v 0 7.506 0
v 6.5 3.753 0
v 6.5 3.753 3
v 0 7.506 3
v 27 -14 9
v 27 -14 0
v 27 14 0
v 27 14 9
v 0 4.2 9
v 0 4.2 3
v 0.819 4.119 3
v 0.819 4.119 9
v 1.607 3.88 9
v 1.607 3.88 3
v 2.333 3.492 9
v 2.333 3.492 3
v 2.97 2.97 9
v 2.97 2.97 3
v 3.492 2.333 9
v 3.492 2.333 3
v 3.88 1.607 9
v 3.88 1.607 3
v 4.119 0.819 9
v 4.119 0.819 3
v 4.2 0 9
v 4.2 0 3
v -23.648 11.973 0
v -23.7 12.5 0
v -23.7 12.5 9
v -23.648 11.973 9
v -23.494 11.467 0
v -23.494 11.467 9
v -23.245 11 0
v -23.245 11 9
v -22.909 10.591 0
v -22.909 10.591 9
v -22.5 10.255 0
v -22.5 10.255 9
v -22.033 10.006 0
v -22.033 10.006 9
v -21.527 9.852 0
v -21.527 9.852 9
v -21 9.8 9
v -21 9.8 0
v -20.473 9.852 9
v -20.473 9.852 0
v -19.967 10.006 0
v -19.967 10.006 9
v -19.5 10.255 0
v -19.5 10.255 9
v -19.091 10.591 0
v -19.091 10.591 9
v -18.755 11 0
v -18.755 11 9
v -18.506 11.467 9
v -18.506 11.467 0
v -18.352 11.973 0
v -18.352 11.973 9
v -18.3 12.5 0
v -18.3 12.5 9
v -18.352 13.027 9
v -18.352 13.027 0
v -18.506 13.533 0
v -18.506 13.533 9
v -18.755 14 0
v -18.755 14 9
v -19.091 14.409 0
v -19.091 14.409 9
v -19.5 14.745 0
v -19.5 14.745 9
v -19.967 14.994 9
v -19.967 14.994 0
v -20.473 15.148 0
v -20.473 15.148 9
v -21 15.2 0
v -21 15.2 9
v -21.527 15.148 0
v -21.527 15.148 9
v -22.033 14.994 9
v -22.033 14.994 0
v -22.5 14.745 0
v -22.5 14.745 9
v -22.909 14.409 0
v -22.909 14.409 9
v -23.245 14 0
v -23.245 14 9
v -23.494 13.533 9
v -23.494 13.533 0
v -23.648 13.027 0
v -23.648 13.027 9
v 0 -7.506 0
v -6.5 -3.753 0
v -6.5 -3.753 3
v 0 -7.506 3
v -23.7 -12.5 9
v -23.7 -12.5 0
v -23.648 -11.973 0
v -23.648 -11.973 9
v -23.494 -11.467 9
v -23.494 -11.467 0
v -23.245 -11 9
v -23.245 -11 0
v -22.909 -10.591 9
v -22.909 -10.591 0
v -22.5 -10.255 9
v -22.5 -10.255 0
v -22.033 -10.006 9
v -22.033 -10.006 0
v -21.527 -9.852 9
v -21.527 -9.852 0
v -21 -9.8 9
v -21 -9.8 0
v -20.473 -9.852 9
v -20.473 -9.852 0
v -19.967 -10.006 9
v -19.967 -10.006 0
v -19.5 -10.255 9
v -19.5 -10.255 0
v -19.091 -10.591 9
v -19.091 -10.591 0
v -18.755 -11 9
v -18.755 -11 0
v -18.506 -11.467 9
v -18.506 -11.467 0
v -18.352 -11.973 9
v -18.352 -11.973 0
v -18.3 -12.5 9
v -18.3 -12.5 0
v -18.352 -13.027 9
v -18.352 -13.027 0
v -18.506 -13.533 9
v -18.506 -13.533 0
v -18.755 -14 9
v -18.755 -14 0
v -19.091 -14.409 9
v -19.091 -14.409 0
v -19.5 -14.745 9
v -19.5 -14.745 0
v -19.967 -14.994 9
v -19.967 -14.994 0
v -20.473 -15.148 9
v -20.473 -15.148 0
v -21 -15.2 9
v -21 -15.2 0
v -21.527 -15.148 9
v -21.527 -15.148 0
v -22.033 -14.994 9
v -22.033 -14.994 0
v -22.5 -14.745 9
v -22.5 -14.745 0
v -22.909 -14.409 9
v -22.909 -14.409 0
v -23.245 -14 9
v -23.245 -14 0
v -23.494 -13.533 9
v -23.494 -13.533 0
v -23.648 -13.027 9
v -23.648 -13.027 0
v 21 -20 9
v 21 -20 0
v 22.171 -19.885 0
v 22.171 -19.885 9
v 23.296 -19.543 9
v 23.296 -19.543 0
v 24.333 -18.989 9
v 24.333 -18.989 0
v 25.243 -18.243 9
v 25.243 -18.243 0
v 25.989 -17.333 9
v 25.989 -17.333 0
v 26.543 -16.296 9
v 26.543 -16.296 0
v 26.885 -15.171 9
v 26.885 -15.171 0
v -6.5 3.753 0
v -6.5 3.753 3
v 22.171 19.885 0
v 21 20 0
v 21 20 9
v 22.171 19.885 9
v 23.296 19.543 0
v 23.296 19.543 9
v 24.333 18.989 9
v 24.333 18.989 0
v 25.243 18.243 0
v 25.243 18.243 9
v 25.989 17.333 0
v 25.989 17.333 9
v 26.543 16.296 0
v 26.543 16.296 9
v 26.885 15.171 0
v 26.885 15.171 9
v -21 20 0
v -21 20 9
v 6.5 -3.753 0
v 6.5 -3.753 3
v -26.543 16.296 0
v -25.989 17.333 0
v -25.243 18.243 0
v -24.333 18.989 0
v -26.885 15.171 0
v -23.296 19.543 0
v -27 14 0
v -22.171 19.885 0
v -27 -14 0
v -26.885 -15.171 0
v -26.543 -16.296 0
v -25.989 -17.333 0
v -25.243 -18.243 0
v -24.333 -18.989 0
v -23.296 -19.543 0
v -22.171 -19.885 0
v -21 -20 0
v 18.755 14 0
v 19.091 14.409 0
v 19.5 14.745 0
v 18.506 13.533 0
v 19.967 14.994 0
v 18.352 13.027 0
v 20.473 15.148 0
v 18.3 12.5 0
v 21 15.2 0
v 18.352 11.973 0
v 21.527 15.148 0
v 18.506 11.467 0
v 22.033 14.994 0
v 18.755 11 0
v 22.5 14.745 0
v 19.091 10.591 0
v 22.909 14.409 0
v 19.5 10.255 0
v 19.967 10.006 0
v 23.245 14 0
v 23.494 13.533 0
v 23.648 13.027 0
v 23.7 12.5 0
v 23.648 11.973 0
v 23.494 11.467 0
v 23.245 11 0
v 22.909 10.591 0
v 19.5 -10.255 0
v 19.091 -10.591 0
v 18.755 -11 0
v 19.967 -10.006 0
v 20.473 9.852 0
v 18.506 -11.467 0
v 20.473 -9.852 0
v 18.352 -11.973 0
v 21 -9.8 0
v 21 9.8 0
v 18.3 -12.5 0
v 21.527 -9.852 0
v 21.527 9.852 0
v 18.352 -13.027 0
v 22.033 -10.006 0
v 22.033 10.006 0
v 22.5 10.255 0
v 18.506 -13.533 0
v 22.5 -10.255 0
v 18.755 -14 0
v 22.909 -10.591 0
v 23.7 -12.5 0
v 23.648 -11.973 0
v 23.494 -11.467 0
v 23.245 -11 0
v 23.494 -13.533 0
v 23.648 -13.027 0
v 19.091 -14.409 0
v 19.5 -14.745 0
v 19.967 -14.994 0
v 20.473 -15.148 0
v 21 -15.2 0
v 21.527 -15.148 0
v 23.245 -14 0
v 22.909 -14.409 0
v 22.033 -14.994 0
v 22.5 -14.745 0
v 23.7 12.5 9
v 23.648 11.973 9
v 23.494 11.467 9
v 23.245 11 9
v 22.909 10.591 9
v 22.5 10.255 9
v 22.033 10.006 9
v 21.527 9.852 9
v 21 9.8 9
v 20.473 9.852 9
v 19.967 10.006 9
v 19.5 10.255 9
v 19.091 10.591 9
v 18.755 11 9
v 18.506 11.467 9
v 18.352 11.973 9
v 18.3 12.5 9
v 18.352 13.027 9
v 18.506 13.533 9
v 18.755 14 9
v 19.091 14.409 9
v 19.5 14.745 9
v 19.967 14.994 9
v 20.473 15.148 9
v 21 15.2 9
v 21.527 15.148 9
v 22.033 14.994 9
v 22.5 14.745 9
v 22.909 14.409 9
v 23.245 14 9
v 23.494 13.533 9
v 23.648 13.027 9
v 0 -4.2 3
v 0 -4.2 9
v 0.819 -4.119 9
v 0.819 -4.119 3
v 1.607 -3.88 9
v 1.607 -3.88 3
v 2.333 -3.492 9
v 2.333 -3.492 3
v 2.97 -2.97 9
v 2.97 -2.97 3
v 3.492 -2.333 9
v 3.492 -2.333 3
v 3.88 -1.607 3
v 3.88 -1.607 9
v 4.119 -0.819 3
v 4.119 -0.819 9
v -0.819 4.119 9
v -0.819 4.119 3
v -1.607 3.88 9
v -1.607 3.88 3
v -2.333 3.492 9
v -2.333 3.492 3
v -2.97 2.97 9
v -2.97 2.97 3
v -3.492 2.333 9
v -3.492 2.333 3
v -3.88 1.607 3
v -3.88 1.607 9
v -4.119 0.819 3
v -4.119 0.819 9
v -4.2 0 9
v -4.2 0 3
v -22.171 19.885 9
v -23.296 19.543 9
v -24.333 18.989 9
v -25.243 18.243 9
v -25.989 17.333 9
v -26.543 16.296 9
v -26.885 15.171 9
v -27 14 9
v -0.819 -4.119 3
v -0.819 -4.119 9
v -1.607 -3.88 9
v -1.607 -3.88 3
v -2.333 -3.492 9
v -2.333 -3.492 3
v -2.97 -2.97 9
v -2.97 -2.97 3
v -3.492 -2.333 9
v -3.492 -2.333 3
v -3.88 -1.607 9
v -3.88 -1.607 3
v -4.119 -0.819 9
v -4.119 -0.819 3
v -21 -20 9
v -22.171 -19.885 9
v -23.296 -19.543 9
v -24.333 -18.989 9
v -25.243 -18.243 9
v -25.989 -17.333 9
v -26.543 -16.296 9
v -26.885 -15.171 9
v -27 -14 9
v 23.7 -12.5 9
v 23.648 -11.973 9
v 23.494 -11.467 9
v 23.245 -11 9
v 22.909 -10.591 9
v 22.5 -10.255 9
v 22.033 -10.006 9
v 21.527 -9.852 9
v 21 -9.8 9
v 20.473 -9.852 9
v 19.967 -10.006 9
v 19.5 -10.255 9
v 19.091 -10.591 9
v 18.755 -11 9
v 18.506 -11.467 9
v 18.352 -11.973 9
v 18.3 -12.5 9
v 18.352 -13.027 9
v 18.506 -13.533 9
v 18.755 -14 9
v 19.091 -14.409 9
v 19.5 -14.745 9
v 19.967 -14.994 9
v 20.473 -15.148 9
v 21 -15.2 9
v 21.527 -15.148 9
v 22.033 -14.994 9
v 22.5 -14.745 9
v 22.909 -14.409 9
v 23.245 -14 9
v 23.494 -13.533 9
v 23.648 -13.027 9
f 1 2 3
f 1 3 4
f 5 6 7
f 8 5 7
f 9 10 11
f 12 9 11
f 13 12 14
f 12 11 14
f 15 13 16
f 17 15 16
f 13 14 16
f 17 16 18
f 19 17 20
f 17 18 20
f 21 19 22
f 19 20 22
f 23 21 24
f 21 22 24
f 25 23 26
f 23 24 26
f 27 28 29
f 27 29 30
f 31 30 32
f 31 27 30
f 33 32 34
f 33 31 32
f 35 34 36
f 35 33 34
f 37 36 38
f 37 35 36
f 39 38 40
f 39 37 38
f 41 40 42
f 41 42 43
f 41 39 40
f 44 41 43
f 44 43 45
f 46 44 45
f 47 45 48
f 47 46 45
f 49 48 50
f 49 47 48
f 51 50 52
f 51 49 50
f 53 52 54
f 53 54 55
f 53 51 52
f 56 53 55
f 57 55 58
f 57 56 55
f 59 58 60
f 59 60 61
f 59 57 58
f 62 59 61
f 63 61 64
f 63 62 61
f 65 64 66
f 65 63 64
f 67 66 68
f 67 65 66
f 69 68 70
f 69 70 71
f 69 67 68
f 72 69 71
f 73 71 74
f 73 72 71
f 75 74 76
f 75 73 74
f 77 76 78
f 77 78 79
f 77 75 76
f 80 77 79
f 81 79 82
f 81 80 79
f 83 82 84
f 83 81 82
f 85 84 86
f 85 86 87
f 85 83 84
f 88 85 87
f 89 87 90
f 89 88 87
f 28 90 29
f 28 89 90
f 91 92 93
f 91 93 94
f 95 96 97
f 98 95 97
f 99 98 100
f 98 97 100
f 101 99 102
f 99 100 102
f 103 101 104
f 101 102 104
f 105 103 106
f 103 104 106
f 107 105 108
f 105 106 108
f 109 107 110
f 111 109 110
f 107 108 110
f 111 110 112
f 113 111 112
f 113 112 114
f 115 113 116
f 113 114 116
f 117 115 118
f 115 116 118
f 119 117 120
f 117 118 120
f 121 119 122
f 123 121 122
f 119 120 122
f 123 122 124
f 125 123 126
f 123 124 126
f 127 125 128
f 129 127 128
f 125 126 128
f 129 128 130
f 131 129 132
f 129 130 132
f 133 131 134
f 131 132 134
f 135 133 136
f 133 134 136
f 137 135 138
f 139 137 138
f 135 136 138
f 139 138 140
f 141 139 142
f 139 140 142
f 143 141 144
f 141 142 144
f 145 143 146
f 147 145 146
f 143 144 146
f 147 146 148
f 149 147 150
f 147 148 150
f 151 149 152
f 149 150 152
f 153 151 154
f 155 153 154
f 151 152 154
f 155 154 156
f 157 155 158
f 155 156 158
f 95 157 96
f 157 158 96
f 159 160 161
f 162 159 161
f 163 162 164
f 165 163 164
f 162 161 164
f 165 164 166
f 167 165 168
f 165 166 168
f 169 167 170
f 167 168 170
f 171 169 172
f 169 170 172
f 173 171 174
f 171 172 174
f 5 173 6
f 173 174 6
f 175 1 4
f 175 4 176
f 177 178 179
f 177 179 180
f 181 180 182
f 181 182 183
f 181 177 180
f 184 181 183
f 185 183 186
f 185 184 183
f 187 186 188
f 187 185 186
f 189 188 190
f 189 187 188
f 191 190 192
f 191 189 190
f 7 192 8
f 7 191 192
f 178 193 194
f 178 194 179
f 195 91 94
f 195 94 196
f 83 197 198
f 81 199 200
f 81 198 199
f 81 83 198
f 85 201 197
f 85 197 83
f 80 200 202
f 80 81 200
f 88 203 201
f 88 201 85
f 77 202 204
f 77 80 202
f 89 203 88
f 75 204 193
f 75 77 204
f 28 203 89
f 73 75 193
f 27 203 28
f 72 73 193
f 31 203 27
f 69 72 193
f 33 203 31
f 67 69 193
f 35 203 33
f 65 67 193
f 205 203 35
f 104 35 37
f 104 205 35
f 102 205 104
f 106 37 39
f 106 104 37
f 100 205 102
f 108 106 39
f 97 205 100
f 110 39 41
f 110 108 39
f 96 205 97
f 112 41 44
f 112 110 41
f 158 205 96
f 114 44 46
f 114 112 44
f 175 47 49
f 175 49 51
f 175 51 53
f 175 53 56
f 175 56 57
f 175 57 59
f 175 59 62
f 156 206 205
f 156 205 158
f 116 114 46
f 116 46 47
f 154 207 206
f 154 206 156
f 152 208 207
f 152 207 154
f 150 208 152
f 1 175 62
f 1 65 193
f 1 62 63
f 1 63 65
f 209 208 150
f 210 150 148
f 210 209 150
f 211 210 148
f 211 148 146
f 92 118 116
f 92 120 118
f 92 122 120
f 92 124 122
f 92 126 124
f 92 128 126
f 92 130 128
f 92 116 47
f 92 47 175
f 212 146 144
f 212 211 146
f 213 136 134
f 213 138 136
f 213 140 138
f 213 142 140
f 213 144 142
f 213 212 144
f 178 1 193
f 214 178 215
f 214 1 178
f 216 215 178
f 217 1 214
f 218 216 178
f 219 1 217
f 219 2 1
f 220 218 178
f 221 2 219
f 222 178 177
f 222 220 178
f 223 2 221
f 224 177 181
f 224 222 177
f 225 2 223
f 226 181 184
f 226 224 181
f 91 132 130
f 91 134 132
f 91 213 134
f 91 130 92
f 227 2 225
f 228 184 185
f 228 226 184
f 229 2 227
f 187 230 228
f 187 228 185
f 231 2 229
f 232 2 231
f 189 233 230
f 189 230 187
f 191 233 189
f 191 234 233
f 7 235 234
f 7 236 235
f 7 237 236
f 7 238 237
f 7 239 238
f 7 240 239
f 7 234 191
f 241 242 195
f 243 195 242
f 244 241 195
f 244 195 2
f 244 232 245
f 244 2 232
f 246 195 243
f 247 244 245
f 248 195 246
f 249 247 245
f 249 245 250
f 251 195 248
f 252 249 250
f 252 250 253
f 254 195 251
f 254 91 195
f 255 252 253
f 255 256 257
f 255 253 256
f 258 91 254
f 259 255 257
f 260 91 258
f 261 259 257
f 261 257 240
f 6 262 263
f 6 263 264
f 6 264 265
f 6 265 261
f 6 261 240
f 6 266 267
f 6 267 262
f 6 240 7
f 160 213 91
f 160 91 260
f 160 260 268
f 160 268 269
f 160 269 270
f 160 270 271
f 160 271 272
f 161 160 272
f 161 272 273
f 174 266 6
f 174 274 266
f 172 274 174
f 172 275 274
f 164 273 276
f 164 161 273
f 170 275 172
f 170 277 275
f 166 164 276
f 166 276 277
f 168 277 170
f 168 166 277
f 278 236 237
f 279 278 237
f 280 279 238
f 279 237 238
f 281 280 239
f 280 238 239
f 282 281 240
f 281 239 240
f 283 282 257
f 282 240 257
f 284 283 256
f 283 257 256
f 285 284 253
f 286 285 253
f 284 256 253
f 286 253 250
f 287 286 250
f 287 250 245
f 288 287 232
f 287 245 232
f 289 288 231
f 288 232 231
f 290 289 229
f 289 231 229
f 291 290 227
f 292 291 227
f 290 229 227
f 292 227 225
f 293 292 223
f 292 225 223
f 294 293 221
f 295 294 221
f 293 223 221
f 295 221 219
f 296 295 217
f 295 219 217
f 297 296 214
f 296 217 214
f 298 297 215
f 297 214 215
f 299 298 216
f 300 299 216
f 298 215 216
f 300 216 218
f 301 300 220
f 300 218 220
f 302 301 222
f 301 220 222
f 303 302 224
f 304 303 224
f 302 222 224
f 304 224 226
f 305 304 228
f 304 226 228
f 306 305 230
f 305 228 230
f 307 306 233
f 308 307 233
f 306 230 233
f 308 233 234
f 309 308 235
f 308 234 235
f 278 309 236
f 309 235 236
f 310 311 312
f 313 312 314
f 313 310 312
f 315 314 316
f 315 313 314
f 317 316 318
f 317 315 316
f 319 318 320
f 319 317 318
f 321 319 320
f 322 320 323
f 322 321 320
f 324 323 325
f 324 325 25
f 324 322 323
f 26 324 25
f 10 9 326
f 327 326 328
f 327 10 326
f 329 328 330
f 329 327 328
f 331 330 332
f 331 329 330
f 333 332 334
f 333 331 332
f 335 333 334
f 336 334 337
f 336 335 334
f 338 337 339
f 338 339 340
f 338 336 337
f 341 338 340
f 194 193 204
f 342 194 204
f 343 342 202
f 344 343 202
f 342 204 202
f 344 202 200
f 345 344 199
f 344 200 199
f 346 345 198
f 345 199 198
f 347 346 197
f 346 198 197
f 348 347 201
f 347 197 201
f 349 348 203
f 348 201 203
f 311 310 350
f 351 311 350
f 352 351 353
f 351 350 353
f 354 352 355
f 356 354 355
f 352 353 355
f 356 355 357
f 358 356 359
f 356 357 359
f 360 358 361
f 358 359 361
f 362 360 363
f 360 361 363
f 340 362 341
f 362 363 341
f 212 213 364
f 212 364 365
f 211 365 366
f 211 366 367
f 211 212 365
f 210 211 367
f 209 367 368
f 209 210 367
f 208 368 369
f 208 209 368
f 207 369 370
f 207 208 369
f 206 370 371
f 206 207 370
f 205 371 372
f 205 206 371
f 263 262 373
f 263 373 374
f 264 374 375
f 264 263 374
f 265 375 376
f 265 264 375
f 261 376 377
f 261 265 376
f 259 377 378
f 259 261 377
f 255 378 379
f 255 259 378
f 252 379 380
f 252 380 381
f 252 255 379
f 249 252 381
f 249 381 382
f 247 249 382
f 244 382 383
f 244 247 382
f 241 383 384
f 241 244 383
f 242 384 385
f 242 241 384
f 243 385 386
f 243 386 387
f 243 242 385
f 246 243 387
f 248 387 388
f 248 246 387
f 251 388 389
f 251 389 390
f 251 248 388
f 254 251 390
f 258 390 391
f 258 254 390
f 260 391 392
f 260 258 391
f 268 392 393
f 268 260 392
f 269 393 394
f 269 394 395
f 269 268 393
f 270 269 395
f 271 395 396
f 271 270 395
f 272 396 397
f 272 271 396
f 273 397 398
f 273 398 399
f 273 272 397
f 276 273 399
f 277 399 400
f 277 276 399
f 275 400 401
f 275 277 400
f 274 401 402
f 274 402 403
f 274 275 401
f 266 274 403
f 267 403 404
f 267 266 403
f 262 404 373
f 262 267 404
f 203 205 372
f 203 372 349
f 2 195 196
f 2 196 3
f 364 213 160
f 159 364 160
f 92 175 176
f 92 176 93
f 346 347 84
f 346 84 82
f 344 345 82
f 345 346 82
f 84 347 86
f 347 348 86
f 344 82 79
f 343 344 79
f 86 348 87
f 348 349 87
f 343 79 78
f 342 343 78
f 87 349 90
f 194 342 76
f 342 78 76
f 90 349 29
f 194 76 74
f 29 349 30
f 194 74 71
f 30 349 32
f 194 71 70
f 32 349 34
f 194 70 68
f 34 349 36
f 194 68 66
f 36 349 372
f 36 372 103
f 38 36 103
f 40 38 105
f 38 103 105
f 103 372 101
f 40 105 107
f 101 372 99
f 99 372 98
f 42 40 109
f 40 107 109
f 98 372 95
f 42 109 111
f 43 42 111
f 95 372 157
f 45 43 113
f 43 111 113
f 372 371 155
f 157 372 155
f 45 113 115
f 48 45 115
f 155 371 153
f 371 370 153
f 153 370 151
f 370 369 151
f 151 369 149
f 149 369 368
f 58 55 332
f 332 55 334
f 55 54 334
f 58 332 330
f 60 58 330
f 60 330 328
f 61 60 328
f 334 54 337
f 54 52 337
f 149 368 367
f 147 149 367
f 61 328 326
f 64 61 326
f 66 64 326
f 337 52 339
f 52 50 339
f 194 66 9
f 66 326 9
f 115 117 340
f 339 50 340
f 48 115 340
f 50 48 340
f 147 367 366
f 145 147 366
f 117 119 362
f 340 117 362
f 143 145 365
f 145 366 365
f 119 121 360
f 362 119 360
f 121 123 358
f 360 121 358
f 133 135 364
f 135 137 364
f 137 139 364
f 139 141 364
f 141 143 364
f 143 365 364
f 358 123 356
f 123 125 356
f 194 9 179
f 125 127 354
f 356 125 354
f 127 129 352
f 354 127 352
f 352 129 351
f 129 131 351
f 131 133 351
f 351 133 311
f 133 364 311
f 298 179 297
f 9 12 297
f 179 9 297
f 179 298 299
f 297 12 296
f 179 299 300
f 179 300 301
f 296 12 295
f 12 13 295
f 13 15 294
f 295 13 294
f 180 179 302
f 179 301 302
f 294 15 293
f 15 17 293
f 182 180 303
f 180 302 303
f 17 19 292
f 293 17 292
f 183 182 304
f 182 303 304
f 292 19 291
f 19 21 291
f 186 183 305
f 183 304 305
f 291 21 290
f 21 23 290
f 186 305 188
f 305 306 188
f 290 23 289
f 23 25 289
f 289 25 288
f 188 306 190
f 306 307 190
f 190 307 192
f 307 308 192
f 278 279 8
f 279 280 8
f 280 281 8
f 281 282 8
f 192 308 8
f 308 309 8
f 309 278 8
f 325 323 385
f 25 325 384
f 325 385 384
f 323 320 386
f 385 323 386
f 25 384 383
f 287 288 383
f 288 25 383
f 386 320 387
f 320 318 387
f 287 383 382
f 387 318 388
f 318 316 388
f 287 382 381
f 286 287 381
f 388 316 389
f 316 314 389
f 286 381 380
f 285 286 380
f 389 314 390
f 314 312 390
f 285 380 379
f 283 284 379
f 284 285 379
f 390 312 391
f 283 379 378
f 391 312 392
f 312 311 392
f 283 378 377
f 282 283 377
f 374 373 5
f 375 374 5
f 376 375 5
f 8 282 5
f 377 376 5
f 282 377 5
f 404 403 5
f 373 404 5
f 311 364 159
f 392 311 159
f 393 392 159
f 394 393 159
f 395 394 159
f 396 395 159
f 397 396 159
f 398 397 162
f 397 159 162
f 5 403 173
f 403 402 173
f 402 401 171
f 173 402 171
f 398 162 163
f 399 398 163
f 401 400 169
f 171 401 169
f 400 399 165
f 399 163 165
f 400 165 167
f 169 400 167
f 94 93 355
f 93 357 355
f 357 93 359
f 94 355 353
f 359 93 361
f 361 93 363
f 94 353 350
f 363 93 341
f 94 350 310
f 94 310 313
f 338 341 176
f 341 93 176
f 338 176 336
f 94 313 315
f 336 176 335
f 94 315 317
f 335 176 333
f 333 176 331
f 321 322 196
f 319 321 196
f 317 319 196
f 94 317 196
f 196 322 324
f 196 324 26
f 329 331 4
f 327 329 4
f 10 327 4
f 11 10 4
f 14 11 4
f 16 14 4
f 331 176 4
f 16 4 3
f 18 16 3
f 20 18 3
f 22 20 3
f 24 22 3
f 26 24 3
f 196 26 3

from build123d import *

# Parameters (mm, degrees)
SKETCH_R             = 2.7
PAD_DEPTH            = 9
SKETCH_MIRRORED_2_R  = 2.7
PAD_MIRRORED_2_DEPTH = 9
POCKET_DEPTH         = 3


with BuildPart() as part:
    # Sketch → Pad (new body)
    with BuildSketch(Plane.XY):
        with BuildLine():
            ThreePointArc((0, -4.2), (2.969848, -2.969848), (4.2, 0))
            Line((4.2, 0), (27, 0))
            Line((27, 0), (27, -14))
            ThreePointArc((21, -20), (25.242641, -18.242641), (27, -14))
            Line((21, -20), (0, -20))
            Line((0, -20), (0, -4.2))
        make_face()
        with Locations((21, -12.5)):
            Circle(SKETCH_R, mode=Mode.SUBTRACT)
    pad = extrude(amount=PAD_DEPTH)

    # Sketch Mirrored 2 → Pad Mirrored 2 (add)
    with BuildSketch(Plane(origin=(0, 0, 0), x_dir=(-1, 0, 0), z_dir=(0, 0, -1))):
        with BuildLine():
            ThreePointArc((0, -4.2), (2.969848, -2.969848), (4.2, 0))
            Line((4.2, 0), (27, 0))
            Line((27, 0), (27, -14))
            ThreePointArc((21, -20), (25.242641, -18.242641), (27, -14))
            Line((21, -20), (0, -20))
            Line((0, -20), (0, -4.2))
        make_face()
        with Locations((21, -12.5)):
            Circle(SKETCH_MIRRORED_2_R, mode=Mode.SUBTRACT)
    pad_mirrored_2 = extrude(amount=-PAD_MIRRORED_2_DEPTH)

    # Mirrored001: Pad, Pad Mirrored 2 across Sketch H_Axis
    add(pad.mirror(Plane.ZX))
    add(pad_mirrored_2.mirror(Plane.ZX))

    # Sketch001 → Pocket (cut)
    with BuildSketch(Plane.XY):
        Polygon((6.5, 3.752777), (0, 7.505553), (-6.5, 3.752777), (-6.5, -3.752777), (0, -7.505553), (6.5, -3.752777), align=None)
    extrude(amount=POCKET_DEPTH, mode=Mode.SUBTRACT)


solid = part.part
